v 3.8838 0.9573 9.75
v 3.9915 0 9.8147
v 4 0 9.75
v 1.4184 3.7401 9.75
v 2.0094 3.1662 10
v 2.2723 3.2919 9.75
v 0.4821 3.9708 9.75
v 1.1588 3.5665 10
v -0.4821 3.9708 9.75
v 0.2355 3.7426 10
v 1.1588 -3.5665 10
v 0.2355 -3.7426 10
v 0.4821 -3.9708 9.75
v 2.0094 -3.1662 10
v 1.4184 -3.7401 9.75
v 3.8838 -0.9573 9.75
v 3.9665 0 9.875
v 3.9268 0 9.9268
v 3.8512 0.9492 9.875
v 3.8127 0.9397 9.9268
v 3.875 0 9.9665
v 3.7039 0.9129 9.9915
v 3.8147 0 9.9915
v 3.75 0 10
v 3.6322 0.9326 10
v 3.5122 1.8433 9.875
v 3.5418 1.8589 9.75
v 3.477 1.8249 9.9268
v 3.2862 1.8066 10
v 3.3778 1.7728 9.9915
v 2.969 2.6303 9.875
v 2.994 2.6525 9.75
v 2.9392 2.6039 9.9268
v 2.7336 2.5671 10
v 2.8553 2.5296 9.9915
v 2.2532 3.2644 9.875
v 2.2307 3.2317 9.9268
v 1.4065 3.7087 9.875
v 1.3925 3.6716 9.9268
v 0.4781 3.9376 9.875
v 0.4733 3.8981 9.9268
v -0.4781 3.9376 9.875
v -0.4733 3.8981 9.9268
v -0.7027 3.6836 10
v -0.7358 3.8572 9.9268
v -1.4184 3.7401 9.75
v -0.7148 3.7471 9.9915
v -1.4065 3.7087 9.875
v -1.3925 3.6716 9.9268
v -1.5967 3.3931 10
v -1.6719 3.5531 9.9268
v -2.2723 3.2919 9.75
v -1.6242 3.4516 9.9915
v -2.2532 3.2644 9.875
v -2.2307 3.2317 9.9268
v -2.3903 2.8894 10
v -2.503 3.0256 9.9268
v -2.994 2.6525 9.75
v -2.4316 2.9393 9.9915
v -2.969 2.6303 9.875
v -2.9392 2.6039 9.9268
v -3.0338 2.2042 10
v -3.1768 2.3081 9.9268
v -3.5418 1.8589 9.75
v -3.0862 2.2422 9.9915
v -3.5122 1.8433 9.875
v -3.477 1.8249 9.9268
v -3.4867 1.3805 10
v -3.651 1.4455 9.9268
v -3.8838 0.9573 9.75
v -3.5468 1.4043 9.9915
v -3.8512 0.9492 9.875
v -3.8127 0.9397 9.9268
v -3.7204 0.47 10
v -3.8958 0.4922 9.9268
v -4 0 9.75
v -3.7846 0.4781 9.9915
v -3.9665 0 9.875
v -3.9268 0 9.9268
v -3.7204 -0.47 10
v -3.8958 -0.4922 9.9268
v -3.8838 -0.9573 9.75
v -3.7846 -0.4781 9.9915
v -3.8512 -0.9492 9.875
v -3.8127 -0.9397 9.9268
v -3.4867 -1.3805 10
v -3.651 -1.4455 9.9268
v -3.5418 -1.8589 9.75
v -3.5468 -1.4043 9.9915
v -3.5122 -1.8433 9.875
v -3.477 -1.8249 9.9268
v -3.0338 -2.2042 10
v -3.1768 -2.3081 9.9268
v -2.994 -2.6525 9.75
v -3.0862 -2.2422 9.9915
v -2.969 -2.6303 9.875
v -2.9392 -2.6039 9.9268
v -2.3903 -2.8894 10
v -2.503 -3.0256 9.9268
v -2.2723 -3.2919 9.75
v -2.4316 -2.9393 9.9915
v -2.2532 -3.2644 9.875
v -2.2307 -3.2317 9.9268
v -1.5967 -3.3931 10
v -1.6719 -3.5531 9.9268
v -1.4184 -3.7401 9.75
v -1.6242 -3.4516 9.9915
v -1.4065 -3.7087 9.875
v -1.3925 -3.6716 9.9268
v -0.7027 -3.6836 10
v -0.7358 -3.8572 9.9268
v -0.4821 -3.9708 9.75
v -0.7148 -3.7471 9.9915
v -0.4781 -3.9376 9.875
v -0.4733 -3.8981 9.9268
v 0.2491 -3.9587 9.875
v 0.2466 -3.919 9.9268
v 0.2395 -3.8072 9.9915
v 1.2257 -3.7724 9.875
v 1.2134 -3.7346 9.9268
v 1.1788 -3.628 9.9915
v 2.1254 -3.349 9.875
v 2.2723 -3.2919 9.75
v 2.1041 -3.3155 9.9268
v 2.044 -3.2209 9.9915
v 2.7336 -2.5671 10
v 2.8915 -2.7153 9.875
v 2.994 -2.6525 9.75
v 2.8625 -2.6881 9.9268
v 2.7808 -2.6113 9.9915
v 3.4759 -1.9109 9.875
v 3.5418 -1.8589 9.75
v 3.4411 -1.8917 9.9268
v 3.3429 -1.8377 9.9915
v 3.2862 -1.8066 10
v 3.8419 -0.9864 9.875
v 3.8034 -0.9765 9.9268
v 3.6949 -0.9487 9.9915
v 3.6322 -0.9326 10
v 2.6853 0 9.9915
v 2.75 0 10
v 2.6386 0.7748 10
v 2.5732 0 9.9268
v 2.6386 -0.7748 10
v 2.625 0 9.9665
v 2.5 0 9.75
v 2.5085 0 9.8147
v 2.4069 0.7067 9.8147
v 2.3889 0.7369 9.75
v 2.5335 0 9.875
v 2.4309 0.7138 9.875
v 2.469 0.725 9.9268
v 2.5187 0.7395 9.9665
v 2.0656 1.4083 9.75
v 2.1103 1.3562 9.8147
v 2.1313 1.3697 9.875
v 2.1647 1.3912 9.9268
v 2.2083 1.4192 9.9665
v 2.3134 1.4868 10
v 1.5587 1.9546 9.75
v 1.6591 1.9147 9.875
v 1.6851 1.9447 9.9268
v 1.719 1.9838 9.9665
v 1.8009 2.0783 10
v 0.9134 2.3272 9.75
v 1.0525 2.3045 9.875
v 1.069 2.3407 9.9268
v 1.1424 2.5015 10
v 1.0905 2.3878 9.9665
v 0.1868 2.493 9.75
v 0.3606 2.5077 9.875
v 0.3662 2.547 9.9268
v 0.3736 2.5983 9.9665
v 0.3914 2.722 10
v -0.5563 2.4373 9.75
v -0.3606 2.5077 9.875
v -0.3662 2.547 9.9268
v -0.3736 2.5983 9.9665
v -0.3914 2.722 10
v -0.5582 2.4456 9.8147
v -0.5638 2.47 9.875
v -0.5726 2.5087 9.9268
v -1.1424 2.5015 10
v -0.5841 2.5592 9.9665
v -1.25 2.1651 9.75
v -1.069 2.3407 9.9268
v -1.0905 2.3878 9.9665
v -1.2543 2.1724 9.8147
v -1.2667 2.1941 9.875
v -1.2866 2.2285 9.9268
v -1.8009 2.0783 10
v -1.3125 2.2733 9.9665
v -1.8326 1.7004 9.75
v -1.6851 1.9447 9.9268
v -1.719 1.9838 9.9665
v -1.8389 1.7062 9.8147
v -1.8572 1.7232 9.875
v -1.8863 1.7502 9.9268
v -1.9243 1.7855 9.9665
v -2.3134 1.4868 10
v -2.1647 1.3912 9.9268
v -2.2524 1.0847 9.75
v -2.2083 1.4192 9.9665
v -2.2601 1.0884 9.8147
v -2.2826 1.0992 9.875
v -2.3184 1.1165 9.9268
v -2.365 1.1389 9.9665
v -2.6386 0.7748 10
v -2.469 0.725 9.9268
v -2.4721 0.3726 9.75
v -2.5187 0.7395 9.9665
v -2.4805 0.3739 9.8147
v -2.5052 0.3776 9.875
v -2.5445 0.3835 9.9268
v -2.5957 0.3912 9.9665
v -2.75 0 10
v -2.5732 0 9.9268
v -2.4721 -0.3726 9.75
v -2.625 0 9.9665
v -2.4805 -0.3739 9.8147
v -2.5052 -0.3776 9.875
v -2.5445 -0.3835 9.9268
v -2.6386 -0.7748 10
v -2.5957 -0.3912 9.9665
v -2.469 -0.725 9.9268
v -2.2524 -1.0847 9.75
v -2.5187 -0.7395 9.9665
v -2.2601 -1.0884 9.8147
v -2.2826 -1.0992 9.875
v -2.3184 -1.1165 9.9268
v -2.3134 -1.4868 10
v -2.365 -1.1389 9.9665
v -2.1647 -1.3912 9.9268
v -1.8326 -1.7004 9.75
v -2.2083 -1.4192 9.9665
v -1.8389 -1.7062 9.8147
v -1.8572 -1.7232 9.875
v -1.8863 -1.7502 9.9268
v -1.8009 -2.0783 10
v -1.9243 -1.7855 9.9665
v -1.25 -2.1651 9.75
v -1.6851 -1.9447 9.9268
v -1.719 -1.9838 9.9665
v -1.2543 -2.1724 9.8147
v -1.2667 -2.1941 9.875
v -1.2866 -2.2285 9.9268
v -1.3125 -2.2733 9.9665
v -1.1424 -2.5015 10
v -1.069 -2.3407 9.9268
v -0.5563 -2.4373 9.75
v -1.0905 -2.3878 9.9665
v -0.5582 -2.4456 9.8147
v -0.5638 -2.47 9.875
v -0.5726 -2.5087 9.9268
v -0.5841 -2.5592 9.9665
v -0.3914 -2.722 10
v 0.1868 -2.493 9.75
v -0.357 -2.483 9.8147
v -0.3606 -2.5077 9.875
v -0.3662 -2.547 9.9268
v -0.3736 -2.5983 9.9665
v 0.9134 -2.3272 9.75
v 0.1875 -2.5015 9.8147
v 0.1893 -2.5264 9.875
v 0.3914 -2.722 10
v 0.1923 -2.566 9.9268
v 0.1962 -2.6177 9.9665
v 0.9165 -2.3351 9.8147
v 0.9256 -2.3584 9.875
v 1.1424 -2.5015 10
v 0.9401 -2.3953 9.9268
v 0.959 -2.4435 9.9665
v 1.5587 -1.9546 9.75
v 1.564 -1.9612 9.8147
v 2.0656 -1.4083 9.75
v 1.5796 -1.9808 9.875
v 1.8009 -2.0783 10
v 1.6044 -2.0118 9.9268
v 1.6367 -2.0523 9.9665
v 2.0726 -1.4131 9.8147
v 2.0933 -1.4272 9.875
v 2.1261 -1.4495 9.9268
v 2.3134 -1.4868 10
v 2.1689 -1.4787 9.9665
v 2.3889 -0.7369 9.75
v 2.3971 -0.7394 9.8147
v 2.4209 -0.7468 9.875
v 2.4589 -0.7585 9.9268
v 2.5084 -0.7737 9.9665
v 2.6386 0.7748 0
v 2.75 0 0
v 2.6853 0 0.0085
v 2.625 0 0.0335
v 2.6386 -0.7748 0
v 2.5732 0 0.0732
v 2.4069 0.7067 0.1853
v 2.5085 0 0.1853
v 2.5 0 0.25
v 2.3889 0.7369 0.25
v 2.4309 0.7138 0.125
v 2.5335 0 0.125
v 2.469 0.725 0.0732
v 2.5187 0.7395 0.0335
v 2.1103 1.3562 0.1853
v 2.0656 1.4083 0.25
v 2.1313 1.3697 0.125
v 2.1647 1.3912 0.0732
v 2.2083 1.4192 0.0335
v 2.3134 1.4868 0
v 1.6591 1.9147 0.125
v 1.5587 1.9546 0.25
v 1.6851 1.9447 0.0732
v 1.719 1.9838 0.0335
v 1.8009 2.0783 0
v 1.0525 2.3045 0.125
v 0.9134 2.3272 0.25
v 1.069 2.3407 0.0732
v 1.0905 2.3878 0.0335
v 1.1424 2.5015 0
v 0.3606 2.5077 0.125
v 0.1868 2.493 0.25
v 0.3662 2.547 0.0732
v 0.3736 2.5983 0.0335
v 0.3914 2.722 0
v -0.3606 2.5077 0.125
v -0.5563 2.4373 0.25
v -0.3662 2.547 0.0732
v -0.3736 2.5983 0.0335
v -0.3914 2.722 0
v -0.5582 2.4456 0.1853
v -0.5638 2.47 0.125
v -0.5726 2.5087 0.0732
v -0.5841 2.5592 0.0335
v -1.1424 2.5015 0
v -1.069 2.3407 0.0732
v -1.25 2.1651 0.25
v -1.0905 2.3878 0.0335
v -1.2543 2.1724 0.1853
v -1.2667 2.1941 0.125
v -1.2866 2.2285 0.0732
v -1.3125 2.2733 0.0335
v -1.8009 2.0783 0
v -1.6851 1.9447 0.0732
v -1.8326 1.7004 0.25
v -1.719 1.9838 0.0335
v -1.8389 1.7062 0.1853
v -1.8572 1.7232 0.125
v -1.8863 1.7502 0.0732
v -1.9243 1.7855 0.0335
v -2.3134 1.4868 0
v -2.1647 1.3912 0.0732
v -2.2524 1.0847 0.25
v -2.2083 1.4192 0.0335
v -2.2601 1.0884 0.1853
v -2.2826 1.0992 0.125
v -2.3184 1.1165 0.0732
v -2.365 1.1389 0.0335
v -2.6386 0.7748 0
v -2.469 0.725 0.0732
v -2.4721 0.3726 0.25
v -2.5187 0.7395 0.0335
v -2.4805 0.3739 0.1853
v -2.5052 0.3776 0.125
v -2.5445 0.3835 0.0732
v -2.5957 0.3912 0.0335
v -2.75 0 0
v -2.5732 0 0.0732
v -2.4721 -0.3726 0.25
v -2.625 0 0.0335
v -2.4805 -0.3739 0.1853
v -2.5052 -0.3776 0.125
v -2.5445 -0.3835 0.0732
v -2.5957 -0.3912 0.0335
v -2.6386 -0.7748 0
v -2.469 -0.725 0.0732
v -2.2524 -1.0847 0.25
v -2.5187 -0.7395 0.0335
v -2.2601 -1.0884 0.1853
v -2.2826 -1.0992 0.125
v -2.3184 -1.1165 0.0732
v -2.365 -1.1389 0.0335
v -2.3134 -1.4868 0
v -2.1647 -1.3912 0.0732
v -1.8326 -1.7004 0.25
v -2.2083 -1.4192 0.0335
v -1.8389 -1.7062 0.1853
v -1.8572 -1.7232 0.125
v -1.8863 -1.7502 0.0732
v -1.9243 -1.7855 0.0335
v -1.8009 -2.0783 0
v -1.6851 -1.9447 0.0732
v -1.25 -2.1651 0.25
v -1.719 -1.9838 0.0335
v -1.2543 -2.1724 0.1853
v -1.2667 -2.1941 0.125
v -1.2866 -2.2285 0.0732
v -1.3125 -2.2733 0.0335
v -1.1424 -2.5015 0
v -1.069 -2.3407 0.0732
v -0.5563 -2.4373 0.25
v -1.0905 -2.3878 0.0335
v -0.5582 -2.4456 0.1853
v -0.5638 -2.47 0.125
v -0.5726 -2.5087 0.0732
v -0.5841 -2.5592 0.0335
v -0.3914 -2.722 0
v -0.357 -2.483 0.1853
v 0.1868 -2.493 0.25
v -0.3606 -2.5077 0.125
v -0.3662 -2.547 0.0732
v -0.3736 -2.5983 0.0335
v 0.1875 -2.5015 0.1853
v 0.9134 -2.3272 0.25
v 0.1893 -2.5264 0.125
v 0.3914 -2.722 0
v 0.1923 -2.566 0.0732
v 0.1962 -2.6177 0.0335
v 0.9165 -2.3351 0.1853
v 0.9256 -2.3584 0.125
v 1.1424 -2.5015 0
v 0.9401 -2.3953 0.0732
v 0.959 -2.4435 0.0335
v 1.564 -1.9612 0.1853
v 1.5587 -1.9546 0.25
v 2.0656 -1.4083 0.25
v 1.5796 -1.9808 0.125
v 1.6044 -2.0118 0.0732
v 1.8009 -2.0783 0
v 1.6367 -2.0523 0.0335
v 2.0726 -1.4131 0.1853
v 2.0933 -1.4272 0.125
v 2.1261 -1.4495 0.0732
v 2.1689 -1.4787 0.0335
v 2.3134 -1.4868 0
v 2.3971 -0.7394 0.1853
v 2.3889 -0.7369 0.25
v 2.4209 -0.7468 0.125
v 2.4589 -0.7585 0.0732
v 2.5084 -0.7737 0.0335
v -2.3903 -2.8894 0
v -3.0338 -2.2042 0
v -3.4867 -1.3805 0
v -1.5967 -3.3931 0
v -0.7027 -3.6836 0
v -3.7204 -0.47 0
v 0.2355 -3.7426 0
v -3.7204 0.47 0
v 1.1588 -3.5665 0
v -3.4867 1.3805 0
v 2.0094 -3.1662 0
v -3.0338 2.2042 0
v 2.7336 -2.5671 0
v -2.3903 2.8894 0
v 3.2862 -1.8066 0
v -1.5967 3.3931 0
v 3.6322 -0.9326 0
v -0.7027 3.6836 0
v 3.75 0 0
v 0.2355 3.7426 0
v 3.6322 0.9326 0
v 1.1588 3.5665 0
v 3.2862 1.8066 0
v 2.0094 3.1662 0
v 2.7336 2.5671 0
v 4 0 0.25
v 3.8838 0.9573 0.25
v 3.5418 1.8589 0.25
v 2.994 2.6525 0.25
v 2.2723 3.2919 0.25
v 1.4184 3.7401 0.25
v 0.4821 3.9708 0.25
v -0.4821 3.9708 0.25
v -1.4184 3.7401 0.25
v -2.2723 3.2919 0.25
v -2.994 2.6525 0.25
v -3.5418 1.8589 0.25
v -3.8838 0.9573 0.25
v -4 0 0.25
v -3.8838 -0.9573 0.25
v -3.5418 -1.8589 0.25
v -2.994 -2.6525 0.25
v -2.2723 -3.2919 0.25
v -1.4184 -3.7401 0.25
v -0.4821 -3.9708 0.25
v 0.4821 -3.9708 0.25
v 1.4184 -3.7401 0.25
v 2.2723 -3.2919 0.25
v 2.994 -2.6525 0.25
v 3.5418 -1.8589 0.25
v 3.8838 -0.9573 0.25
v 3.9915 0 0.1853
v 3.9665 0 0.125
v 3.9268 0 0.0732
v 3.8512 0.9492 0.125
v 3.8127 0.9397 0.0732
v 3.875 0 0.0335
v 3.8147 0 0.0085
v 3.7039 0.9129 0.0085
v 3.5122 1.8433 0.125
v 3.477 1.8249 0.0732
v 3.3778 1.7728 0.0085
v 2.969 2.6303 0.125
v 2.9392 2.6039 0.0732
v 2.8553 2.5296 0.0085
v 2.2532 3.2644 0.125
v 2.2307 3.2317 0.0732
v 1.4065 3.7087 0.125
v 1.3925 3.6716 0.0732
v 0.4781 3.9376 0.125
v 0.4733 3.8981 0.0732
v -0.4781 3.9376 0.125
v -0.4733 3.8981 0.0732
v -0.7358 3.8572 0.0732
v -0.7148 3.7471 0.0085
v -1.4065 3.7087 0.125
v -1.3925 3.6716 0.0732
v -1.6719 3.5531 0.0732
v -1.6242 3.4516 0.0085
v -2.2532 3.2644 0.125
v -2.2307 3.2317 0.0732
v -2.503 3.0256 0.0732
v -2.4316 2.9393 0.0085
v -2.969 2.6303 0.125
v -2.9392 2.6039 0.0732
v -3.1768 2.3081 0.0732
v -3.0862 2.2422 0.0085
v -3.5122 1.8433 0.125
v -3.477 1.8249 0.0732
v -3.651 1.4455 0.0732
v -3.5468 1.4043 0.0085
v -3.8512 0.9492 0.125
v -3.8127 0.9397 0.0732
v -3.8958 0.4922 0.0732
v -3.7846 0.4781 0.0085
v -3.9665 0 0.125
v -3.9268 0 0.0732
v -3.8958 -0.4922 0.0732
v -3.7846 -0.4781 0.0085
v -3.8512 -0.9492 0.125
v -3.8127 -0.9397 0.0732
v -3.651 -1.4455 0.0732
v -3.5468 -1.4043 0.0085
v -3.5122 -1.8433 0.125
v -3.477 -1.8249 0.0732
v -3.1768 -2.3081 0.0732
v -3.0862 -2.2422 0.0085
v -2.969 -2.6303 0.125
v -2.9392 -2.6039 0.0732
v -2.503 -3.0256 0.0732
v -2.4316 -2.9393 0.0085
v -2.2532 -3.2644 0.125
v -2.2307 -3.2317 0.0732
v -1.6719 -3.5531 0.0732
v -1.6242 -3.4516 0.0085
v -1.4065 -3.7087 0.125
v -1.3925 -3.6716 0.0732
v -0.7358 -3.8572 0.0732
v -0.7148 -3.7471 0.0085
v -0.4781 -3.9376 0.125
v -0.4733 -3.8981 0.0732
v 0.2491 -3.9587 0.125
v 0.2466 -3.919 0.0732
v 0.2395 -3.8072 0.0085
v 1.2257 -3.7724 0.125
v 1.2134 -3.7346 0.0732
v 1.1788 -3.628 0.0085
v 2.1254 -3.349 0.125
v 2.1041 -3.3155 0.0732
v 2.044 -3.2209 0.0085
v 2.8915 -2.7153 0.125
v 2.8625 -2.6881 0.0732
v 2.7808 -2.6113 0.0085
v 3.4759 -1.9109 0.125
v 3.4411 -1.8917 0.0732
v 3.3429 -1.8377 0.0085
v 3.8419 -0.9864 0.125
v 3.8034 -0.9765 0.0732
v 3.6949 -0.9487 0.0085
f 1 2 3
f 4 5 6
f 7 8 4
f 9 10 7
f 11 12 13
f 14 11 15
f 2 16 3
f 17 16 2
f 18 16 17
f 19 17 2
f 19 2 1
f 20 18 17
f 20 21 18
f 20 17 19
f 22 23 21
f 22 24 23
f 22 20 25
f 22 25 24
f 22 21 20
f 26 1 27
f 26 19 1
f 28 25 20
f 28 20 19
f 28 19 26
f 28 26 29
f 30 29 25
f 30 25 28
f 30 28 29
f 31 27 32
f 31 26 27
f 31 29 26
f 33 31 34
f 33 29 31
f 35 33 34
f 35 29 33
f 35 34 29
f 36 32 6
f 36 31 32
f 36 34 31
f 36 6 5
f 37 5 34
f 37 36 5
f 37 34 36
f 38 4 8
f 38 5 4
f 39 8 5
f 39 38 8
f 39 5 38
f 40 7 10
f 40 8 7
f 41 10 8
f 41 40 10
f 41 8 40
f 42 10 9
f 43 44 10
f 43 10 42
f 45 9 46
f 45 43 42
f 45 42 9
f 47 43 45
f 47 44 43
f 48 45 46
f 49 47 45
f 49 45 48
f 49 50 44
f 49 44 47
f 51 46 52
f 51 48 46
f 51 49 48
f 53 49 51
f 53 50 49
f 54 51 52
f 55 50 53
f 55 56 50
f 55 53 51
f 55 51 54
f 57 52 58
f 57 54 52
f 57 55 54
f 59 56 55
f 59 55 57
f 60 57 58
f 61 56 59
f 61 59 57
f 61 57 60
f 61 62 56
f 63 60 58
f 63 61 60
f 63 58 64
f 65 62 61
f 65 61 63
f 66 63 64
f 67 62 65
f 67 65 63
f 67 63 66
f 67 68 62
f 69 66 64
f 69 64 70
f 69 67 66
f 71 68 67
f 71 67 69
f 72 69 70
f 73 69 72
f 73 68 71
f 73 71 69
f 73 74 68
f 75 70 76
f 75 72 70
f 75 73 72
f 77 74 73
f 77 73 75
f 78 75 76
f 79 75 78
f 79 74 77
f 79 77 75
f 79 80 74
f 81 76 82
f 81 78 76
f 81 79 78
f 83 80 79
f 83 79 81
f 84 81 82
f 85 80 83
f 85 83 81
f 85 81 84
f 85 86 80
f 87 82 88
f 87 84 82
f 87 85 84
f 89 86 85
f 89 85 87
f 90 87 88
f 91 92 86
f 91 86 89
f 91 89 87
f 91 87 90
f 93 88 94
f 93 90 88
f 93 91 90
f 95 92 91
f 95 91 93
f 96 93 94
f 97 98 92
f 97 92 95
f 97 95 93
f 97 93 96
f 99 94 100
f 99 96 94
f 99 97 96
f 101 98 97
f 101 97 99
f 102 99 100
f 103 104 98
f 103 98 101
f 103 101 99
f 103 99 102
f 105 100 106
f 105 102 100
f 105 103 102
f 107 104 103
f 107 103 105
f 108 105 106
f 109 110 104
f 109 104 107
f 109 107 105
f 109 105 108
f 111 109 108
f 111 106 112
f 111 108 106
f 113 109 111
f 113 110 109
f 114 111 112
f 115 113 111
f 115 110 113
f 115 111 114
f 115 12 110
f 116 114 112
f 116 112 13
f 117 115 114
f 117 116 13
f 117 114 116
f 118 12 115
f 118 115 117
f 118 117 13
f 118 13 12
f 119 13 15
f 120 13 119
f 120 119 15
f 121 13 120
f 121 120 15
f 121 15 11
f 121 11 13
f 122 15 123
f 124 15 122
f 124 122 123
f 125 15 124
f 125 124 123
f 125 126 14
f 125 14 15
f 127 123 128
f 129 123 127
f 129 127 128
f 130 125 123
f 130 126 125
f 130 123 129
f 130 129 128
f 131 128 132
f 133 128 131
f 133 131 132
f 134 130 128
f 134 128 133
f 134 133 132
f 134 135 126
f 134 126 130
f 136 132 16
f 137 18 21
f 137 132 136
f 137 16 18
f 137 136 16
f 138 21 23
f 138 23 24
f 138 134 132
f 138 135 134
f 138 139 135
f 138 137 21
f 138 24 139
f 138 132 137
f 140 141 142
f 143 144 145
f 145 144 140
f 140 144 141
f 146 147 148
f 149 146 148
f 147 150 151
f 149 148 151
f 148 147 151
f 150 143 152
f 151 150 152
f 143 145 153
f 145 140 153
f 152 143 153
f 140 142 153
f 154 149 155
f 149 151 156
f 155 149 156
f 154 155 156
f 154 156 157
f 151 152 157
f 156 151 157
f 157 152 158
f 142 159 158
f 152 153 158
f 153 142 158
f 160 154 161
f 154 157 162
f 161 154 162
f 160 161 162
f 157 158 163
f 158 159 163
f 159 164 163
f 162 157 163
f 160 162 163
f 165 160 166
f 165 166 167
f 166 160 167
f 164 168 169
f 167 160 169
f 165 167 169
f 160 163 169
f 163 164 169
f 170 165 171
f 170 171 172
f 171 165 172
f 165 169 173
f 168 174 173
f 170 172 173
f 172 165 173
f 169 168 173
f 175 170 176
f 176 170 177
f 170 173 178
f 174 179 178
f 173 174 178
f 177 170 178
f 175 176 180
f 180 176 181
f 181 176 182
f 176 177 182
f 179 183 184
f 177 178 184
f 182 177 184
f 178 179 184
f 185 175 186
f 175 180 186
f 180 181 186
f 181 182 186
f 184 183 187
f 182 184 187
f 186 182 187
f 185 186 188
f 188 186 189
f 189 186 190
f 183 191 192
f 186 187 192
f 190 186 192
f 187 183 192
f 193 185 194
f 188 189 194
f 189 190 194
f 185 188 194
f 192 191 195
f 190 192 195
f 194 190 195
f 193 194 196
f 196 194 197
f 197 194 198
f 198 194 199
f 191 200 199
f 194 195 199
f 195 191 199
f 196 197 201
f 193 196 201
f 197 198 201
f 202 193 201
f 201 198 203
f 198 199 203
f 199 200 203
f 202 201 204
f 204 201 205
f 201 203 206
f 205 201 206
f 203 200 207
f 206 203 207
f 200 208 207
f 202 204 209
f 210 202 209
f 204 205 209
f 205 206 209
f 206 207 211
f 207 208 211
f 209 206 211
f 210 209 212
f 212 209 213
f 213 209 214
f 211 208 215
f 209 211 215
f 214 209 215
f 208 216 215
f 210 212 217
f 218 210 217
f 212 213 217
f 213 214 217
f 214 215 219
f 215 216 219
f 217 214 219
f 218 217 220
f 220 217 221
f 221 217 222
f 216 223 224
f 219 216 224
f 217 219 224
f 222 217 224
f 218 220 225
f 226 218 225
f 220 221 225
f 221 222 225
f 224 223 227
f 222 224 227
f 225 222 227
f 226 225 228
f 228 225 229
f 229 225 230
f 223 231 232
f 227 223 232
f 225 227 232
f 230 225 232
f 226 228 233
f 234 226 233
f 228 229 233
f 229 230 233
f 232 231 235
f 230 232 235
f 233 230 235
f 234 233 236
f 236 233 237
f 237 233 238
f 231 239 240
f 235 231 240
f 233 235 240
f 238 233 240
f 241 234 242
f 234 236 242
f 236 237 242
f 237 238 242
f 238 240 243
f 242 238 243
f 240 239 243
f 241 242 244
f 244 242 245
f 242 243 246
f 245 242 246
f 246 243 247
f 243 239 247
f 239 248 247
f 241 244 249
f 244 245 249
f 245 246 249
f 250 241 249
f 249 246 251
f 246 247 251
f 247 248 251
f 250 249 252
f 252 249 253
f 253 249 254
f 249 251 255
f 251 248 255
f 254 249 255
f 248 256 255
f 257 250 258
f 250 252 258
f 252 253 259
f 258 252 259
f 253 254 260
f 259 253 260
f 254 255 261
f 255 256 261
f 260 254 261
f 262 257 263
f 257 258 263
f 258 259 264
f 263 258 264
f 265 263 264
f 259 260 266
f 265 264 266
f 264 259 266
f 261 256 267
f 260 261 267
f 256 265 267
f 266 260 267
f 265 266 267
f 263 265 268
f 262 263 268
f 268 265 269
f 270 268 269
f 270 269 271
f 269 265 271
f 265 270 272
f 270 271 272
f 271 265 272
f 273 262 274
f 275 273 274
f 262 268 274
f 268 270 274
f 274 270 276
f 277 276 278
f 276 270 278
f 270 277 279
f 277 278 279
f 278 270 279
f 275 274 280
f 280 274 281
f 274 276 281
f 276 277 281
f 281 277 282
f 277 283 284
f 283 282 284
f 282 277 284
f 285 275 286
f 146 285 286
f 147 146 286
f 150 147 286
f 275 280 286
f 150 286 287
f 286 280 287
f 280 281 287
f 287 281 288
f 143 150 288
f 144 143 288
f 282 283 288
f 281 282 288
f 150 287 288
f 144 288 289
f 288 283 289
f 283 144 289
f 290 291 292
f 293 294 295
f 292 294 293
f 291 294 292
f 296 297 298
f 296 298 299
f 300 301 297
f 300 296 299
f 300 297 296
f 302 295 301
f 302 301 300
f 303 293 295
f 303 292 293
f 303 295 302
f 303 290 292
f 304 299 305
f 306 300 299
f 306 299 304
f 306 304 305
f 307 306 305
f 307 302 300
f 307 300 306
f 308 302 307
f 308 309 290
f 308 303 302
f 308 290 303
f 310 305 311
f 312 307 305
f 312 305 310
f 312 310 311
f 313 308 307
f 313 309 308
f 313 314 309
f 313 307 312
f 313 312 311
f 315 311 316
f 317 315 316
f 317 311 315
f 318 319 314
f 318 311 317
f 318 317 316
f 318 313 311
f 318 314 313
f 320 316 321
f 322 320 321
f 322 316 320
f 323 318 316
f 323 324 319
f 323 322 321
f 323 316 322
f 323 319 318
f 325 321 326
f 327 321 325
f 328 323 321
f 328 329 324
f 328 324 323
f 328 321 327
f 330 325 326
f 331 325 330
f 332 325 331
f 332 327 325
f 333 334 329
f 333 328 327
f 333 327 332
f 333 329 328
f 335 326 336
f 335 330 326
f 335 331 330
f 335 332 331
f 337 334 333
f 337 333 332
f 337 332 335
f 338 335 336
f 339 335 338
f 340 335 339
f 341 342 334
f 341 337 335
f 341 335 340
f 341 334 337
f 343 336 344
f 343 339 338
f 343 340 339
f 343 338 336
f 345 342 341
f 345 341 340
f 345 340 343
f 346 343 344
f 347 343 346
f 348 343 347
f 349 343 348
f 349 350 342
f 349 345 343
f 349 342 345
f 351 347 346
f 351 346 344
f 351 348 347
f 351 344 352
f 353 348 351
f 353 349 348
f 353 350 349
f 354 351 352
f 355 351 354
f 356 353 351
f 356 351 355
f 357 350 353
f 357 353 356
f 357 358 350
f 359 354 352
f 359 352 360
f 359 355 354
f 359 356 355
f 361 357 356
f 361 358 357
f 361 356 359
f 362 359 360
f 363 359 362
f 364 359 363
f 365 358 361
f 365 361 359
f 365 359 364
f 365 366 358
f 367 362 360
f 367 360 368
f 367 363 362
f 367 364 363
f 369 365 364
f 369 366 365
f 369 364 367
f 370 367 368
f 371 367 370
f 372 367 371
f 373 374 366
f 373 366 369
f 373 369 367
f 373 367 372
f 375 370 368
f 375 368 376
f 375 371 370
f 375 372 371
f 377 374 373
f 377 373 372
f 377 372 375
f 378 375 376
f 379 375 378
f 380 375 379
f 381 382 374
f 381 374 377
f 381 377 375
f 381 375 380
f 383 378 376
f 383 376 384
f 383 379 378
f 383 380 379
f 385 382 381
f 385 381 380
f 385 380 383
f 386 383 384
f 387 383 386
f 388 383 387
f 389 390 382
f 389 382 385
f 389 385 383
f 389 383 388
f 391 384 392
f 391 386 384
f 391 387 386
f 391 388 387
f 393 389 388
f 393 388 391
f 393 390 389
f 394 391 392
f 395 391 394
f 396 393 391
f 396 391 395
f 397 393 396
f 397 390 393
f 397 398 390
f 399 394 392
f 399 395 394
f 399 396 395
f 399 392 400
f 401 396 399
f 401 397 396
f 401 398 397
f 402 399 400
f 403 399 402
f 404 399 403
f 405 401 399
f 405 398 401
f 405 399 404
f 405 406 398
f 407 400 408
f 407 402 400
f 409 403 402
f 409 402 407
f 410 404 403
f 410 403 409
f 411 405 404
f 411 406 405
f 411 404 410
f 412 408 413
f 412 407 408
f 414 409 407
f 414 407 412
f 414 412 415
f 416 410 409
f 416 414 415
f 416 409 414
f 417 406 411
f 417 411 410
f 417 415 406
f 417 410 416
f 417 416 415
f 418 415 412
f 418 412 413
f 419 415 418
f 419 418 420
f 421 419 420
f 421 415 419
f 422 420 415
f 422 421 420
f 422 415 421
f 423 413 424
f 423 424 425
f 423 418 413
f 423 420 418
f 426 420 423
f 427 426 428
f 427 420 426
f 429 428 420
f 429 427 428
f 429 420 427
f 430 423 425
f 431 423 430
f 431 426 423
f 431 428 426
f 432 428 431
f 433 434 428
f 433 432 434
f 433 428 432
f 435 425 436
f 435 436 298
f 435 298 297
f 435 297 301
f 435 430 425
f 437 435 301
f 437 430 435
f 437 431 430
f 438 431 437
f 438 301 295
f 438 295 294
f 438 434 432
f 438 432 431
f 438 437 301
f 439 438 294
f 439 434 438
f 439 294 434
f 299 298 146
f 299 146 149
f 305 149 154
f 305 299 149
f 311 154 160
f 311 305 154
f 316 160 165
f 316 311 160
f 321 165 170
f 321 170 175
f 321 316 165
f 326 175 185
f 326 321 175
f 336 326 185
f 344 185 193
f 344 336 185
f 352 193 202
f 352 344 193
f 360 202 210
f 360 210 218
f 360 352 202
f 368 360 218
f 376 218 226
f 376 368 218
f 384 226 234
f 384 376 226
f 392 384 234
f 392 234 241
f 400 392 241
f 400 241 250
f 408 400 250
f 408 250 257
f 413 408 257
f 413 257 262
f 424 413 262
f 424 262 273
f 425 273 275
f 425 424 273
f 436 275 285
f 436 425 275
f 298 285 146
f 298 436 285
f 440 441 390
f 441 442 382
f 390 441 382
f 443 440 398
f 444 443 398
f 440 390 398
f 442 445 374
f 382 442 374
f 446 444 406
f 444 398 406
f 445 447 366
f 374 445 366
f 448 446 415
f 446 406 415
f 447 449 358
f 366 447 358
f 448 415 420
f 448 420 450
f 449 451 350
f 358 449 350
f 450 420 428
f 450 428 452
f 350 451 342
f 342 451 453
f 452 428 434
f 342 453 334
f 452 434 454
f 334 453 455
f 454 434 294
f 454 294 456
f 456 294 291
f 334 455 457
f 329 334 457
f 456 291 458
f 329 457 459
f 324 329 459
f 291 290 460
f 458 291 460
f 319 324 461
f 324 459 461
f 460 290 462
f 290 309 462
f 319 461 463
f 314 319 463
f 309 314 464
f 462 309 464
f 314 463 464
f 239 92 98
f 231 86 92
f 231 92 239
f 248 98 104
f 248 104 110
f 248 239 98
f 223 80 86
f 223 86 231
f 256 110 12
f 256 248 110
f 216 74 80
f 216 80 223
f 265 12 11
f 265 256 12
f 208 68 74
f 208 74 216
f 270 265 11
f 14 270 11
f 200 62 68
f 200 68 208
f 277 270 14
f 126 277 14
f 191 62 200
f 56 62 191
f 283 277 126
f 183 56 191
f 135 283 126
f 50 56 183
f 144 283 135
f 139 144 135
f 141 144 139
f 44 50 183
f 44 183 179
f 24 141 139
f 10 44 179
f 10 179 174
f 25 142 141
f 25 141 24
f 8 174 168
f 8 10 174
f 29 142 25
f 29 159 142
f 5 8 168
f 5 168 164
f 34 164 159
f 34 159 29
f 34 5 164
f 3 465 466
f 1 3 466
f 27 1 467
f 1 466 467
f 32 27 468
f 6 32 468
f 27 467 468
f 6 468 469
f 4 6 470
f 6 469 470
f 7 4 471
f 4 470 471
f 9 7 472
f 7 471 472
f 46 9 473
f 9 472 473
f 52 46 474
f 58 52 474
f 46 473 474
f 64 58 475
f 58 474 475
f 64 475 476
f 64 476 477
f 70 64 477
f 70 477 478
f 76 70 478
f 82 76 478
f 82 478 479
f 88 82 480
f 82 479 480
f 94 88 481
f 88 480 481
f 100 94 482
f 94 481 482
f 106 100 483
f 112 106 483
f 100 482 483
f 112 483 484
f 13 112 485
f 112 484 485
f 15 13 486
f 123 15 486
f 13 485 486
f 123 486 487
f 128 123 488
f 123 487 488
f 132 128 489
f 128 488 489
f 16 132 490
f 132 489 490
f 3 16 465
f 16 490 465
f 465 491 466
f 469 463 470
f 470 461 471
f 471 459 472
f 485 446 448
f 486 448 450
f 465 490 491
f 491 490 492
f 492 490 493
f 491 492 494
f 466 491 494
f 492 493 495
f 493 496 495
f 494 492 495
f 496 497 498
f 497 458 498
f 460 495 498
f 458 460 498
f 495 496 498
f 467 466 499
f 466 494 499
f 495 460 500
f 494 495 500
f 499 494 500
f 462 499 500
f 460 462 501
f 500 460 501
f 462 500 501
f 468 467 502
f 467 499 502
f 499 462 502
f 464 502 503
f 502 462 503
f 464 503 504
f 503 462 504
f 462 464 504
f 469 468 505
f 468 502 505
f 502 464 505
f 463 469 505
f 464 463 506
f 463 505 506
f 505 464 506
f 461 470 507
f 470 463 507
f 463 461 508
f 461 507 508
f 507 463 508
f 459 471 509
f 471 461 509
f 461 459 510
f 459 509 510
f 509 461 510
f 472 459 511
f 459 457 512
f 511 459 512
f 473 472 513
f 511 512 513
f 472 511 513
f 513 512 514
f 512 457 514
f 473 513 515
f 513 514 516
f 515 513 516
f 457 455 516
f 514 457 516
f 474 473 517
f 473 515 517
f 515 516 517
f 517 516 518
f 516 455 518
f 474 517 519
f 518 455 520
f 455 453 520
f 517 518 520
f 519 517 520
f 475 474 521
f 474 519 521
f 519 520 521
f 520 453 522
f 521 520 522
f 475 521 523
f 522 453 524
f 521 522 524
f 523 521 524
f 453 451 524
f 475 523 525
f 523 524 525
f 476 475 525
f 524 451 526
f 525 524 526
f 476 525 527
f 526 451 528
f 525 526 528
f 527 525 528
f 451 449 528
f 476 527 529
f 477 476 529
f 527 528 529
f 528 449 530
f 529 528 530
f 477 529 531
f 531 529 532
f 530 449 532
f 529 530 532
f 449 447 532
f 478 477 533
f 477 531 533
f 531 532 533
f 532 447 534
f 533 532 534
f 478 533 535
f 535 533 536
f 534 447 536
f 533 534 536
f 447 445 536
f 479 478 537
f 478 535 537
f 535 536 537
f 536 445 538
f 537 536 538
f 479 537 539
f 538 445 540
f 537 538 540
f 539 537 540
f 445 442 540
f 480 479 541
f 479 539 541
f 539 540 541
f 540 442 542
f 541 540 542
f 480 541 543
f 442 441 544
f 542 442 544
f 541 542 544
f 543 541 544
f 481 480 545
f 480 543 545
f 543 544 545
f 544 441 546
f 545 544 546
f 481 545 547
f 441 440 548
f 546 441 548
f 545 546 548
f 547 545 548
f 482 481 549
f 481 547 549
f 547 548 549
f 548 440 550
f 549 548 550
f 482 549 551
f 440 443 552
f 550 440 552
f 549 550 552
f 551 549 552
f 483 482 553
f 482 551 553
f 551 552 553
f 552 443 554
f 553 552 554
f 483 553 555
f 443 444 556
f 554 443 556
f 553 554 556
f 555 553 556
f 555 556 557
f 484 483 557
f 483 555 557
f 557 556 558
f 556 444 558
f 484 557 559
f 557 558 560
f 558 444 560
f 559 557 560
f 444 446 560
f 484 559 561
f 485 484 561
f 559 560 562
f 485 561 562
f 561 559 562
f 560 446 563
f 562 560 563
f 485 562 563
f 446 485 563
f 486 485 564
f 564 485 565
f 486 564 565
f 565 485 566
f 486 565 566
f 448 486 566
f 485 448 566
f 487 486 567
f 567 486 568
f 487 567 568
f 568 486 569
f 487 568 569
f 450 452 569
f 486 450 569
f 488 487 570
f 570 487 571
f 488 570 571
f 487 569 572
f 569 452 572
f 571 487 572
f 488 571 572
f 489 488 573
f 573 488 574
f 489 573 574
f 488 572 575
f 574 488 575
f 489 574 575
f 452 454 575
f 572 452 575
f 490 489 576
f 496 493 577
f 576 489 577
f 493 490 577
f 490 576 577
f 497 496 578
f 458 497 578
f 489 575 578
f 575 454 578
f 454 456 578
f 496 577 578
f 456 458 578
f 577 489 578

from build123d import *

# Parameters (mm, degrees)
SKETCH1_R           = 4
SKETCH1_R_2         = 2.5
BOSS_EXTRUDE1_DEPTH = 10
FILLET1_R           = 0.25


with BuildPart() as part:
    # Sketch1 → Boss-Extrude1 (new body)
    with BuildSketch(Plane.XY):
        Circle(SKETCH1_R)
        Circle(SKETCH1_R_2, mode=Mode.SUBTRACT)
    extrude(amount=BOSS_EXTRUDE1_DEPTH)

    # Fillet1
    fillet1_edges = [part.edges().sort_by_distance(p)[0] for p in [
        (-4, 0, 10),
        (-4, 0, 0),
        (-2.5, 0, 0),
        (-2.5, 0, 10),
    ]]
    fillet(fillet1_edges, radius=FILLET1_R)


solid = part.part
